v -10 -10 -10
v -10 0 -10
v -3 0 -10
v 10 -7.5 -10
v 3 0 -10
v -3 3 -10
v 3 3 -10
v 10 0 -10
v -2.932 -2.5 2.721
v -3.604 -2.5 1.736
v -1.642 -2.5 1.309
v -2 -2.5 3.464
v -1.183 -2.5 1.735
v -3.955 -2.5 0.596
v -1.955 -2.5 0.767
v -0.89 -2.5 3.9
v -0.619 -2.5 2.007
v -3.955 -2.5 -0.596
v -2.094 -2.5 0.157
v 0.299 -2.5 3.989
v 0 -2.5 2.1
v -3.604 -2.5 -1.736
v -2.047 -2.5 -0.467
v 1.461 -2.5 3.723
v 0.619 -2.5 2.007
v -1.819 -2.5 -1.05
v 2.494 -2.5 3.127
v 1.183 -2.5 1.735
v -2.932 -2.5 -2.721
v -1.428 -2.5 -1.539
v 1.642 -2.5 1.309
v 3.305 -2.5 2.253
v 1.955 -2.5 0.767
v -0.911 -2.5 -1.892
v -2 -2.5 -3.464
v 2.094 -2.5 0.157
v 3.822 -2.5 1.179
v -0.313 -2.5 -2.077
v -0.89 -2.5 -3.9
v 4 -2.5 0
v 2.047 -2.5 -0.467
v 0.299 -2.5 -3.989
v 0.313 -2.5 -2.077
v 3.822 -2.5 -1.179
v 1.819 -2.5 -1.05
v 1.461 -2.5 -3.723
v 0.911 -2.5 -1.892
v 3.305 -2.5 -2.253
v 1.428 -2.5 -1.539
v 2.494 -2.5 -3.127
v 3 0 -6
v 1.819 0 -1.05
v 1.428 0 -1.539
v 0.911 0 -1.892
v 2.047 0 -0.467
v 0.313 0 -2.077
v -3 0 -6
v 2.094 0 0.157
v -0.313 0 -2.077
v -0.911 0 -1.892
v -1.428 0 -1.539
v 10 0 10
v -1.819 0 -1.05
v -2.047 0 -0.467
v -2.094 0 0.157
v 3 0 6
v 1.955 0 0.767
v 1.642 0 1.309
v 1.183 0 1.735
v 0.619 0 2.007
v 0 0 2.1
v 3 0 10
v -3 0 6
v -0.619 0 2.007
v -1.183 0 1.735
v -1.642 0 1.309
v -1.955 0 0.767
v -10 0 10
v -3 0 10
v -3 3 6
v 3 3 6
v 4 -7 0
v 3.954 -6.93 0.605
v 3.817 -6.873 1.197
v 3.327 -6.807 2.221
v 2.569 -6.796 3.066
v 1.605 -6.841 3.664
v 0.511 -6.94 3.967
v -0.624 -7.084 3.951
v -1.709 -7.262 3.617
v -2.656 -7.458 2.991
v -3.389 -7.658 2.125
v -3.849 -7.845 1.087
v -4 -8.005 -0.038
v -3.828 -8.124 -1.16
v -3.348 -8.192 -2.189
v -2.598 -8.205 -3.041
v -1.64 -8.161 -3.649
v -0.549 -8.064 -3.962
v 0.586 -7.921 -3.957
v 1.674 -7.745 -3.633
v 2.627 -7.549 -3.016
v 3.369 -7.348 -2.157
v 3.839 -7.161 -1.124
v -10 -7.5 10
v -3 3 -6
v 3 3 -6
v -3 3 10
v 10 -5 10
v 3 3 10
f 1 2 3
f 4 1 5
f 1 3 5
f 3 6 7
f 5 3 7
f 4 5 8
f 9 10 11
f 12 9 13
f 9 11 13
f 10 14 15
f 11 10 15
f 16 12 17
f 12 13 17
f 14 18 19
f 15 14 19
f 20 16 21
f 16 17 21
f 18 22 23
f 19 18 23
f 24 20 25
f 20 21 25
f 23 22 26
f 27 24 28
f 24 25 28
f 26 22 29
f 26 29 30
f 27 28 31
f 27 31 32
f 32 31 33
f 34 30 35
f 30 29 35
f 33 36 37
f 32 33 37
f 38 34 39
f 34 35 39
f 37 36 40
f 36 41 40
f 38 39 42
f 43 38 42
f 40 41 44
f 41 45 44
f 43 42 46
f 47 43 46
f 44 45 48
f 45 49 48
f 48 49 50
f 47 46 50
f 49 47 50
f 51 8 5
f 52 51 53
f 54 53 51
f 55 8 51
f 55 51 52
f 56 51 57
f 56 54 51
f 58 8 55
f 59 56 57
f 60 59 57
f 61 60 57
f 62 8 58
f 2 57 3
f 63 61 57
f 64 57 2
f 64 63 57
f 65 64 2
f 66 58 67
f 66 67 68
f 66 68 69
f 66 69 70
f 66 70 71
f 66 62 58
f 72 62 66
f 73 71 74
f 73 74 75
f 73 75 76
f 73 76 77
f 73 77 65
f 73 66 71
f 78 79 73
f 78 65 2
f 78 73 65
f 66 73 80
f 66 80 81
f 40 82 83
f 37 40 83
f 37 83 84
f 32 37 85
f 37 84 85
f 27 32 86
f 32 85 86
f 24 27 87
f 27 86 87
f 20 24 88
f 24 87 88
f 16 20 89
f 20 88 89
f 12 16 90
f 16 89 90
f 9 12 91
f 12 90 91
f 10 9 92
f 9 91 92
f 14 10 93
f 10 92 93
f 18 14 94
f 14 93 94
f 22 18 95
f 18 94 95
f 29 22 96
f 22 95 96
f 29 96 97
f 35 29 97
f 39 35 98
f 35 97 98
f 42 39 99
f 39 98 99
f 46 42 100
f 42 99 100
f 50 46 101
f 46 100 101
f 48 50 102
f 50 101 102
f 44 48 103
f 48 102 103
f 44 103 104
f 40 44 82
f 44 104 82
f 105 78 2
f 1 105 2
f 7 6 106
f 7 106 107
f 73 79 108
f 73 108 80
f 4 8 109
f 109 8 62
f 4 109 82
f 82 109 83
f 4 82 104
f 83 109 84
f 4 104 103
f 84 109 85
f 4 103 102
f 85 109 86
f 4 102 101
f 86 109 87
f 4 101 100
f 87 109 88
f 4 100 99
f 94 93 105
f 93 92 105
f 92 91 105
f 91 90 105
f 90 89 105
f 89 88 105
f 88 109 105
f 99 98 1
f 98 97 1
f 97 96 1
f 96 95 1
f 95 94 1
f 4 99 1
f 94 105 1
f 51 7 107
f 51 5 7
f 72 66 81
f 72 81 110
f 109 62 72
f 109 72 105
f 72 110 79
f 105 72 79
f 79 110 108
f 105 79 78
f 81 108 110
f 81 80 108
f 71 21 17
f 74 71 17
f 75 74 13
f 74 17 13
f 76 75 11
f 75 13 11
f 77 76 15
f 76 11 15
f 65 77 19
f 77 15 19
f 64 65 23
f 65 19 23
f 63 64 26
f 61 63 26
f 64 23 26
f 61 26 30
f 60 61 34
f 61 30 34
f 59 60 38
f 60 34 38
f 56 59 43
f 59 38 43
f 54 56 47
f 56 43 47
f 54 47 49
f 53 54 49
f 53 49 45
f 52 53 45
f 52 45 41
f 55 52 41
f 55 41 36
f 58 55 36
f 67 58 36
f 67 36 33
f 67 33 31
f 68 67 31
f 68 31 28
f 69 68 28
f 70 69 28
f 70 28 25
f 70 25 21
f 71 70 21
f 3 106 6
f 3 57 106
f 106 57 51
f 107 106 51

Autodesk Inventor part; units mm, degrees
ref_plane "YZ Plane" through (0, 0, 0) normal (1, 0, 0) x (0, 1, 0)
sketch "Sketch1" plane through (0, 0, 0) normal (0, 1, 0) x (-1, 0, 0)
  line L0 (10, -10) -> (-10, -10)
  line L1 (-10, -10) -> (-10, 10)
  line L2 (-10, 10) -> (10, 10)
  line L3 (10, 10) -> (10, -10)
  dimension "d0" = 20
  dimension "d1" = 20
extrude "Main Body Extrusion" add sketch "Sketch1" against normal blind 10
ref_plane "Work Plane1" through (10, 0, 10) normal (0.7071, 0, -0.7071) x (0, -1, 0)
sketch "Sketch2" plane through (10, 0, 10) normal (0.7071, 0, -0.7071) x (0, -1, 0)
  line L0 (0, 0) -> (10, 0) projected
  line L1 (10, 14.1421) -> (10, 28.2843) projected
  line L2 (5, 0) -> (10, 28.2843)
  line L3 (5, 0) -> (10, 0)
  line L4 (10, 0) -> (10, 14.1421) projected
  line L5 (10, 14.1421) -> (10, 0)
  point P0 (0, 14.1421)
extrude "Slanted Cut" cut sketch "Sketch2" along normal through all both and the other way through all
sketch "Sketch3" plane through (0, 0, 0) normal (0, 1, 0) x (1, 0, 0)
  point P0 (0, 0)
  point P1 (0, 0)
hole "Screw Hole" at (0, 0, 0) direction (0, -1, 0) diameter 4.2 end through all
ref_plane "Work Plane2" through (0, -10, 0) normal (0, 1, 0) x (1, 0, 0)
sketch "Sketch4" plane through (0, -10, 0) normal (0, 1, 0) x (1, 0, 0)
  circle A0 centre (0, 0) radius 4
  dimension "d14" = 8
extrude "Counterbore for Screw Hole" cut sketch "Sketch4" along normal blind 7.5
sketch "Sketch5" plane through (0, 0, 0) normal (0, 1, 0) x (1, 0, 0)
  line L0 (-10, -10) -> (10, -10) projected
  line L1 (3, -10) -> (-3, -10)
  line L2 (-3, -10) -> (-3, 10)
  line L3 (-3, 10) -> (3, 10)
  line L4 (3, 10) -> (3, -10)
  circle A0 centre (0, 0) radius 2.1 projected
  line L5 (3, 10) -> (-3, 10)
  line L6 (-3, 10) -> (-3, 6)
  line L7 (-3, 6) -> (3, 6)
  line L8 (3, 6) -> (3, 10)
  line L9 (3, -10) -> (-3, -10)
  line L10 (-3, -10) -> (-3, -6)
  line L11 (-3, -6) -> (3, -6)
  line L12 (3, -6) -> (3, -10)
extrude "Alignment Extrusion" add sketch "Sketch5" along normal blind 3 contours L2 L11 L4 L0 | L2 L3 L4 L7
properties part number "corner_3DPrint"
